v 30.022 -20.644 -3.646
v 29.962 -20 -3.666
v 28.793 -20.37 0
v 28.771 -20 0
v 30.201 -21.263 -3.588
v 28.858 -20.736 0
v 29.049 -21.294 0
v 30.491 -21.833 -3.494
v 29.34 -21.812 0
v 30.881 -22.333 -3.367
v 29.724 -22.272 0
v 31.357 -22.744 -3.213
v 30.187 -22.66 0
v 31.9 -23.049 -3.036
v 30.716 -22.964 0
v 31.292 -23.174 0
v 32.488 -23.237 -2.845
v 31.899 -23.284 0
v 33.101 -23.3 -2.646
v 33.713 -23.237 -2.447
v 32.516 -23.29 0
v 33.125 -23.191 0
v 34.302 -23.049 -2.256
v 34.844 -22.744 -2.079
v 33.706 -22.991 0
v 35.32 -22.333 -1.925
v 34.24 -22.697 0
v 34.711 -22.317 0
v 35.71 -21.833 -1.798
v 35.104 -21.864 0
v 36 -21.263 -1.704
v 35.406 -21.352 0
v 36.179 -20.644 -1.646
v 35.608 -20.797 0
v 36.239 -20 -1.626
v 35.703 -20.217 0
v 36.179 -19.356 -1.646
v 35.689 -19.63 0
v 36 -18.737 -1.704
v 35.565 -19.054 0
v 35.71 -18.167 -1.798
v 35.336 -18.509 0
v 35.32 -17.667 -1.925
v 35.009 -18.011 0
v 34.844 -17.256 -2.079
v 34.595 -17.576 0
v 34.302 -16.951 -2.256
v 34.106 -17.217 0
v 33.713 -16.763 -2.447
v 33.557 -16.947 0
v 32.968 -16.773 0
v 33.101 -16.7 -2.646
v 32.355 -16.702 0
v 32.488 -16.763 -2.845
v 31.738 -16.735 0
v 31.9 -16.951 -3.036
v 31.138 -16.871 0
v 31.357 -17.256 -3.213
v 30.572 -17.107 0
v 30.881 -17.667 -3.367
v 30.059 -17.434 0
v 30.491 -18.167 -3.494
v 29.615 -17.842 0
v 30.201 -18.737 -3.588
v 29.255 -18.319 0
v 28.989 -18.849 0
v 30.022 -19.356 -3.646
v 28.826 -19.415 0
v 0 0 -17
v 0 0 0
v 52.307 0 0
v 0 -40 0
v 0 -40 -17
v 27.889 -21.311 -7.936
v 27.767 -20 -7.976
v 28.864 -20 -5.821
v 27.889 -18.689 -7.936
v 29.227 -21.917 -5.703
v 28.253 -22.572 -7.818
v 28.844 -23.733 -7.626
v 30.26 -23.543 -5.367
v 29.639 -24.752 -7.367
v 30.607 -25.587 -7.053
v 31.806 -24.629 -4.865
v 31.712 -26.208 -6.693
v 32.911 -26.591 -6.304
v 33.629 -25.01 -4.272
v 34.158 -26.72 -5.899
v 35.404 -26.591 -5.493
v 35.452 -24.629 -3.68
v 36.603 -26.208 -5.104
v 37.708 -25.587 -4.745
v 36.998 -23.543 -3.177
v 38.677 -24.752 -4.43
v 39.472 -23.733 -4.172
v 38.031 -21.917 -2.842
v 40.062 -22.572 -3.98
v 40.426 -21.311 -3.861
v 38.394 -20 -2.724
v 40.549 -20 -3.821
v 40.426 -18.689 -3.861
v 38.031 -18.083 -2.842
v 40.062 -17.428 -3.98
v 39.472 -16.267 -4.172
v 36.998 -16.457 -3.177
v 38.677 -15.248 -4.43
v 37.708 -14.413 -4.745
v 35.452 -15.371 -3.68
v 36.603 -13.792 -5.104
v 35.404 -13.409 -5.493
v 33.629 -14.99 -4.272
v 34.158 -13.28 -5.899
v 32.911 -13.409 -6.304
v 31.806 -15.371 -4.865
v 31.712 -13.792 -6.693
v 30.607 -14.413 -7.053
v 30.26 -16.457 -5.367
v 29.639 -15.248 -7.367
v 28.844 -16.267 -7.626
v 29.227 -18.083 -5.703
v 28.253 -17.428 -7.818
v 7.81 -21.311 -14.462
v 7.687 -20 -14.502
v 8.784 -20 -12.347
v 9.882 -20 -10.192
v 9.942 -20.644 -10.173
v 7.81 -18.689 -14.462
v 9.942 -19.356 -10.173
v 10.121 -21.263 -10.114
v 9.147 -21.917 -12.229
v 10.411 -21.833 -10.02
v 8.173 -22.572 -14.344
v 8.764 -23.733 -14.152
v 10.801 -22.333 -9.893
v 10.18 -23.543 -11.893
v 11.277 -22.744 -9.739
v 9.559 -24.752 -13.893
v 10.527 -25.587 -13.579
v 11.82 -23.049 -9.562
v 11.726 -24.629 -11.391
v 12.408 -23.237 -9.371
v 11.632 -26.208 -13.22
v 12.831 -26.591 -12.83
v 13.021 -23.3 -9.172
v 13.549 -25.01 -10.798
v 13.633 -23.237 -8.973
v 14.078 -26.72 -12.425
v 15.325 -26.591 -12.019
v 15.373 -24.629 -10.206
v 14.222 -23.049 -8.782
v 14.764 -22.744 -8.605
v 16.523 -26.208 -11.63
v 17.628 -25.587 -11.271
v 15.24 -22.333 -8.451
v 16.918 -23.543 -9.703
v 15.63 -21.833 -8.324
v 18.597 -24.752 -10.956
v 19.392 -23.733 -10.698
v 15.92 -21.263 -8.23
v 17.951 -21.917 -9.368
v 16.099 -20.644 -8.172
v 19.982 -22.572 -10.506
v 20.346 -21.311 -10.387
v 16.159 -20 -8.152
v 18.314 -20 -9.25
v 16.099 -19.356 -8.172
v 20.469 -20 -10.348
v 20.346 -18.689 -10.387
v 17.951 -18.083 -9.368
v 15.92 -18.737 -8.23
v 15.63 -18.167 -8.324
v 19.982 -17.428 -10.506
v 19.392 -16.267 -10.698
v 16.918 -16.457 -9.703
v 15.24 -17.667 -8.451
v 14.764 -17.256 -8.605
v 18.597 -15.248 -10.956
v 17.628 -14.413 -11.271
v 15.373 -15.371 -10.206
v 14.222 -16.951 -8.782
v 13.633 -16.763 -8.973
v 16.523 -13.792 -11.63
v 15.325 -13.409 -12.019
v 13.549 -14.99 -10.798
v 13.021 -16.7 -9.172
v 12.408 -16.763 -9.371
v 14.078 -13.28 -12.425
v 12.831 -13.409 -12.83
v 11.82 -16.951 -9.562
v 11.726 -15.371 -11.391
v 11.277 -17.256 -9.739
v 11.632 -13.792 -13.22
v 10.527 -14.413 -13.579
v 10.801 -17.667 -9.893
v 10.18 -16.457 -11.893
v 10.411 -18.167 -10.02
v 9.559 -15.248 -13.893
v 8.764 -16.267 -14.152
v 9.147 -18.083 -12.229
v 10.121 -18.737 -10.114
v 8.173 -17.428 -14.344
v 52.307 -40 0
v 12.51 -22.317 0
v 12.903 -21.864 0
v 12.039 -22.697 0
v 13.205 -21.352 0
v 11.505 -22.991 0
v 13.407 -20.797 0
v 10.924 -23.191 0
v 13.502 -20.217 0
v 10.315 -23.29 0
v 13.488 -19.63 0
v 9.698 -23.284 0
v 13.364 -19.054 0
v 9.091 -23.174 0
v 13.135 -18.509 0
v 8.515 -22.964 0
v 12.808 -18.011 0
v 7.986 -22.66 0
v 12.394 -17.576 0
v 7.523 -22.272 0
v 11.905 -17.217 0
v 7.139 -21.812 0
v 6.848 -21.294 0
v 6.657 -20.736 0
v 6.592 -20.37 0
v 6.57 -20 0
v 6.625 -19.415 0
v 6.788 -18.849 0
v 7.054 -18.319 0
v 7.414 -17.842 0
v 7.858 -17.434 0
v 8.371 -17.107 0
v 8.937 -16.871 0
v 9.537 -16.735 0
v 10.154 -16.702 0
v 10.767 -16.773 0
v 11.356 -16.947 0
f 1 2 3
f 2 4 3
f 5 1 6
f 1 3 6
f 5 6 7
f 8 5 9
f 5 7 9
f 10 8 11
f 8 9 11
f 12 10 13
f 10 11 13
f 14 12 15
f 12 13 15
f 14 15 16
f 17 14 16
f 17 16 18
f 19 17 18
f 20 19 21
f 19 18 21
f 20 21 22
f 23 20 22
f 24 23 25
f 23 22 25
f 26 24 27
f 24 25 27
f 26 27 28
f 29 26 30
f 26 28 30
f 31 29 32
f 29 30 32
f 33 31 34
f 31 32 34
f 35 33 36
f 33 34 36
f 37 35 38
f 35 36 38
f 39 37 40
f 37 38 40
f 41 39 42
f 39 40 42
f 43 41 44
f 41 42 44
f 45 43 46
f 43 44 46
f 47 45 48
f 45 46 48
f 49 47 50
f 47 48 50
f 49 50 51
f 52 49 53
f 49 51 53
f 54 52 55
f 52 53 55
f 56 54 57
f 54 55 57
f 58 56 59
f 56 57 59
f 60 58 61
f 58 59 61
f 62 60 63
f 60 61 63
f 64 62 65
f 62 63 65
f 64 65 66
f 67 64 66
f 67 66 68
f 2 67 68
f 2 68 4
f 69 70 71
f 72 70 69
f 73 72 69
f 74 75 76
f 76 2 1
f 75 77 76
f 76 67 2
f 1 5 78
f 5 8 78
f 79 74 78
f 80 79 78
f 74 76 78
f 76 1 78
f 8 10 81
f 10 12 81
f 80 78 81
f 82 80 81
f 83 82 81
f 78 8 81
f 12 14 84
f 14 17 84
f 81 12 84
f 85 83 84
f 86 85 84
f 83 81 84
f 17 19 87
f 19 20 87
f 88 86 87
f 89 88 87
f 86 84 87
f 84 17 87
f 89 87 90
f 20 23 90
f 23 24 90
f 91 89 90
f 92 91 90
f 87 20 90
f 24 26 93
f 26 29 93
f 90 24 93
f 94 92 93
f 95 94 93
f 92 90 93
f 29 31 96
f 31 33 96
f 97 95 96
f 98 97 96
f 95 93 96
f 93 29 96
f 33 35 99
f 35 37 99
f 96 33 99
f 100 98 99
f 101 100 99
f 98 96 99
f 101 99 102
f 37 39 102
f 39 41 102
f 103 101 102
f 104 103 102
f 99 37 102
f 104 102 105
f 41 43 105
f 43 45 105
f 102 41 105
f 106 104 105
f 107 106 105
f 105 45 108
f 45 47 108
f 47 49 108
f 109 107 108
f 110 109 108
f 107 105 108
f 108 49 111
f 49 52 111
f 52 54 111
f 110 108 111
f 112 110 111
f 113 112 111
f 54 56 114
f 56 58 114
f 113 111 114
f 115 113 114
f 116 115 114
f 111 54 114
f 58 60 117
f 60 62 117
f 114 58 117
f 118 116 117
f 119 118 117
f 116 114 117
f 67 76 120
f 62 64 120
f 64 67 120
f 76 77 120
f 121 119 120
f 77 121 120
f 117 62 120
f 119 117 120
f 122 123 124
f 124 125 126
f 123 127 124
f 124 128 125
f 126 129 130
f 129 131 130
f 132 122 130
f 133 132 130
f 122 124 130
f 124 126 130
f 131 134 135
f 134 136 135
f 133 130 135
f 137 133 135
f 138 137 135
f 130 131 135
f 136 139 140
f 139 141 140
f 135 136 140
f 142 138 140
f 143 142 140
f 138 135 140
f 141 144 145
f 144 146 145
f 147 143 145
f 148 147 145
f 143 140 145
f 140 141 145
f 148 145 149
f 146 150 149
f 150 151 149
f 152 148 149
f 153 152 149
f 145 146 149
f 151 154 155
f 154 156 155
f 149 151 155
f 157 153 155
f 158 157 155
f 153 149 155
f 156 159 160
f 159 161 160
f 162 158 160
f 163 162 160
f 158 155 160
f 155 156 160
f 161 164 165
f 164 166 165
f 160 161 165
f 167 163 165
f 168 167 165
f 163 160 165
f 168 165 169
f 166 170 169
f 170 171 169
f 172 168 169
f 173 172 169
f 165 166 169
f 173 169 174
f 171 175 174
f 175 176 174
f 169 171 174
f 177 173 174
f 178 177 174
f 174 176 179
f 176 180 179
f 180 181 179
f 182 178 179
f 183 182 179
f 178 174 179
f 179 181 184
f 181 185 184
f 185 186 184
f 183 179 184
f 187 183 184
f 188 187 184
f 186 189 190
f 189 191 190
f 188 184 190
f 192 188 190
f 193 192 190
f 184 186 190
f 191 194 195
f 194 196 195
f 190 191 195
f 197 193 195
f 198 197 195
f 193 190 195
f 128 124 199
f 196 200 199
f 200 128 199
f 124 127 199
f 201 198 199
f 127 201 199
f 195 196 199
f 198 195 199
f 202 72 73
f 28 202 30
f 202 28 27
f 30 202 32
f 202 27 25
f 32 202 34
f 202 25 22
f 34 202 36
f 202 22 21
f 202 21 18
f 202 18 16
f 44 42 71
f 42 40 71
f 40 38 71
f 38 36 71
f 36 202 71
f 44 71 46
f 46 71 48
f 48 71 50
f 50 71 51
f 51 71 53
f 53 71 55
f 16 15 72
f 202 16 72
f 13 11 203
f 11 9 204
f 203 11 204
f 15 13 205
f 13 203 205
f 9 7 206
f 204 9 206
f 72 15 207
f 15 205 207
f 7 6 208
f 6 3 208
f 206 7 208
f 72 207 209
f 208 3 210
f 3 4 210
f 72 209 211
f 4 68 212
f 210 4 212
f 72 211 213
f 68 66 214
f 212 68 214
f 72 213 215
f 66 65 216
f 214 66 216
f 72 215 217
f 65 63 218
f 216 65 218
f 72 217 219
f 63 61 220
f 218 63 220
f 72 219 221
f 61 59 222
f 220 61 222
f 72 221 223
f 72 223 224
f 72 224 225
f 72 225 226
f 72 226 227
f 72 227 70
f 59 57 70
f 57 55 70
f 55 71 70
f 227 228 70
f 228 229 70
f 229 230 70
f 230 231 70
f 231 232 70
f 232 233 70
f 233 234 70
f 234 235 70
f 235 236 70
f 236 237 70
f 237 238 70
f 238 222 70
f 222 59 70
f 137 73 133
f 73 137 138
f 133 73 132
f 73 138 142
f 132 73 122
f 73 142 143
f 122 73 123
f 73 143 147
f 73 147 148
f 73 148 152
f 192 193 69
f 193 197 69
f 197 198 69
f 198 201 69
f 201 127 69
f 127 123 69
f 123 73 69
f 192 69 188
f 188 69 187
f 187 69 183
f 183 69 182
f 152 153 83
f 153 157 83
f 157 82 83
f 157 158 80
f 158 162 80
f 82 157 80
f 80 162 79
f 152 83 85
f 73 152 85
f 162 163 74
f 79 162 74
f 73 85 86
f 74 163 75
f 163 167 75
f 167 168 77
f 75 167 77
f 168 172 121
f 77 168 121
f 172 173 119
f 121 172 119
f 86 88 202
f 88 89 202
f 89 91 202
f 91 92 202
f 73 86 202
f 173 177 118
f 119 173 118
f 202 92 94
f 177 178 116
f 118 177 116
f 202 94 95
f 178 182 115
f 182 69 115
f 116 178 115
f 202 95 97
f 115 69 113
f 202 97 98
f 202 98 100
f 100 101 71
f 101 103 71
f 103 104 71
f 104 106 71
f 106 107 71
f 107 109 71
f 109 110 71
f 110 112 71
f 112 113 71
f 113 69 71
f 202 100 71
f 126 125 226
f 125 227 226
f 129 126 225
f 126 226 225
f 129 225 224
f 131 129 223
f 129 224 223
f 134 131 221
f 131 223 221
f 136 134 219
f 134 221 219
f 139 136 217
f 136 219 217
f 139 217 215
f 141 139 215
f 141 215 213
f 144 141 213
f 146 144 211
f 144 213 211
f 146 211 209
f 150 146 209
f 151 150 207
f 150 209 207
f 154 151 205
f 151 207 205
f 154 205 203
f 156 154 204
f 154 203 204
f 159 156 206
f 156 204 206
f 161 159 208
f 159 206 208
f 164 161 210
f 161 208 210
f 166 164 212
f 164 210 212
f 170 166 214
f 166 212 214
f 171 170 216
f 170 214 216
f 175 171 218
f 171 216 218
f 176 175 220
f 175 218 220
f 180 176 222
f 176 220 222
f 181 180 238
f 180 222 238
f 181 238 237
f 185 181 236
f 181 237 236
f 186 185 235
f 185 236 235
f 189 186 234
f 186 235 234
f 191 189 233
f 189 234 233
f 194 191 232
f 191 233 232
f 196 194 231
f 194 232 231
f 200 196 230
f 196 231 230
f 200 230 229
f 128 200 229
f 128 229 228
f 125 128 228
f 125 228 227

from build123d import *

# Parameters (mm, degrees)
F1_DEPTH       = 40
F3_D           = 6.6
F3_CSINK_D     = 13.44
F3_CSINK_ANGLE = 90


# Not quite as in the source:
# - a feature names something its author has since deleted; it is built from what else it names


with BuildPart() as f1:
    # F0 (on Front) → F1 (new body)
    with BuildSketch(Plane.XZ):
        Polygon((52.3067873225, 0), (0, 0), (0, -17), align=None)
    extrude(amount=F1_DEPTH)

    # F3 (through all)
    with Locations(Plane(origin=(4.997243483, 0, -15.3758677686), x_dir=(0.9510324968, 0, 0.3090909091), z_dir=(0.3090909091, 0, -0.9510324968))):
        with Locations((9.5479916781, 20), (30.6618269533, 20)):
            CounterSinkHole(F3_D / 2, F3_CSINK_D / 2, counter_sink_angle=F3_CSINK_ANGLE)


solid = f1.part
